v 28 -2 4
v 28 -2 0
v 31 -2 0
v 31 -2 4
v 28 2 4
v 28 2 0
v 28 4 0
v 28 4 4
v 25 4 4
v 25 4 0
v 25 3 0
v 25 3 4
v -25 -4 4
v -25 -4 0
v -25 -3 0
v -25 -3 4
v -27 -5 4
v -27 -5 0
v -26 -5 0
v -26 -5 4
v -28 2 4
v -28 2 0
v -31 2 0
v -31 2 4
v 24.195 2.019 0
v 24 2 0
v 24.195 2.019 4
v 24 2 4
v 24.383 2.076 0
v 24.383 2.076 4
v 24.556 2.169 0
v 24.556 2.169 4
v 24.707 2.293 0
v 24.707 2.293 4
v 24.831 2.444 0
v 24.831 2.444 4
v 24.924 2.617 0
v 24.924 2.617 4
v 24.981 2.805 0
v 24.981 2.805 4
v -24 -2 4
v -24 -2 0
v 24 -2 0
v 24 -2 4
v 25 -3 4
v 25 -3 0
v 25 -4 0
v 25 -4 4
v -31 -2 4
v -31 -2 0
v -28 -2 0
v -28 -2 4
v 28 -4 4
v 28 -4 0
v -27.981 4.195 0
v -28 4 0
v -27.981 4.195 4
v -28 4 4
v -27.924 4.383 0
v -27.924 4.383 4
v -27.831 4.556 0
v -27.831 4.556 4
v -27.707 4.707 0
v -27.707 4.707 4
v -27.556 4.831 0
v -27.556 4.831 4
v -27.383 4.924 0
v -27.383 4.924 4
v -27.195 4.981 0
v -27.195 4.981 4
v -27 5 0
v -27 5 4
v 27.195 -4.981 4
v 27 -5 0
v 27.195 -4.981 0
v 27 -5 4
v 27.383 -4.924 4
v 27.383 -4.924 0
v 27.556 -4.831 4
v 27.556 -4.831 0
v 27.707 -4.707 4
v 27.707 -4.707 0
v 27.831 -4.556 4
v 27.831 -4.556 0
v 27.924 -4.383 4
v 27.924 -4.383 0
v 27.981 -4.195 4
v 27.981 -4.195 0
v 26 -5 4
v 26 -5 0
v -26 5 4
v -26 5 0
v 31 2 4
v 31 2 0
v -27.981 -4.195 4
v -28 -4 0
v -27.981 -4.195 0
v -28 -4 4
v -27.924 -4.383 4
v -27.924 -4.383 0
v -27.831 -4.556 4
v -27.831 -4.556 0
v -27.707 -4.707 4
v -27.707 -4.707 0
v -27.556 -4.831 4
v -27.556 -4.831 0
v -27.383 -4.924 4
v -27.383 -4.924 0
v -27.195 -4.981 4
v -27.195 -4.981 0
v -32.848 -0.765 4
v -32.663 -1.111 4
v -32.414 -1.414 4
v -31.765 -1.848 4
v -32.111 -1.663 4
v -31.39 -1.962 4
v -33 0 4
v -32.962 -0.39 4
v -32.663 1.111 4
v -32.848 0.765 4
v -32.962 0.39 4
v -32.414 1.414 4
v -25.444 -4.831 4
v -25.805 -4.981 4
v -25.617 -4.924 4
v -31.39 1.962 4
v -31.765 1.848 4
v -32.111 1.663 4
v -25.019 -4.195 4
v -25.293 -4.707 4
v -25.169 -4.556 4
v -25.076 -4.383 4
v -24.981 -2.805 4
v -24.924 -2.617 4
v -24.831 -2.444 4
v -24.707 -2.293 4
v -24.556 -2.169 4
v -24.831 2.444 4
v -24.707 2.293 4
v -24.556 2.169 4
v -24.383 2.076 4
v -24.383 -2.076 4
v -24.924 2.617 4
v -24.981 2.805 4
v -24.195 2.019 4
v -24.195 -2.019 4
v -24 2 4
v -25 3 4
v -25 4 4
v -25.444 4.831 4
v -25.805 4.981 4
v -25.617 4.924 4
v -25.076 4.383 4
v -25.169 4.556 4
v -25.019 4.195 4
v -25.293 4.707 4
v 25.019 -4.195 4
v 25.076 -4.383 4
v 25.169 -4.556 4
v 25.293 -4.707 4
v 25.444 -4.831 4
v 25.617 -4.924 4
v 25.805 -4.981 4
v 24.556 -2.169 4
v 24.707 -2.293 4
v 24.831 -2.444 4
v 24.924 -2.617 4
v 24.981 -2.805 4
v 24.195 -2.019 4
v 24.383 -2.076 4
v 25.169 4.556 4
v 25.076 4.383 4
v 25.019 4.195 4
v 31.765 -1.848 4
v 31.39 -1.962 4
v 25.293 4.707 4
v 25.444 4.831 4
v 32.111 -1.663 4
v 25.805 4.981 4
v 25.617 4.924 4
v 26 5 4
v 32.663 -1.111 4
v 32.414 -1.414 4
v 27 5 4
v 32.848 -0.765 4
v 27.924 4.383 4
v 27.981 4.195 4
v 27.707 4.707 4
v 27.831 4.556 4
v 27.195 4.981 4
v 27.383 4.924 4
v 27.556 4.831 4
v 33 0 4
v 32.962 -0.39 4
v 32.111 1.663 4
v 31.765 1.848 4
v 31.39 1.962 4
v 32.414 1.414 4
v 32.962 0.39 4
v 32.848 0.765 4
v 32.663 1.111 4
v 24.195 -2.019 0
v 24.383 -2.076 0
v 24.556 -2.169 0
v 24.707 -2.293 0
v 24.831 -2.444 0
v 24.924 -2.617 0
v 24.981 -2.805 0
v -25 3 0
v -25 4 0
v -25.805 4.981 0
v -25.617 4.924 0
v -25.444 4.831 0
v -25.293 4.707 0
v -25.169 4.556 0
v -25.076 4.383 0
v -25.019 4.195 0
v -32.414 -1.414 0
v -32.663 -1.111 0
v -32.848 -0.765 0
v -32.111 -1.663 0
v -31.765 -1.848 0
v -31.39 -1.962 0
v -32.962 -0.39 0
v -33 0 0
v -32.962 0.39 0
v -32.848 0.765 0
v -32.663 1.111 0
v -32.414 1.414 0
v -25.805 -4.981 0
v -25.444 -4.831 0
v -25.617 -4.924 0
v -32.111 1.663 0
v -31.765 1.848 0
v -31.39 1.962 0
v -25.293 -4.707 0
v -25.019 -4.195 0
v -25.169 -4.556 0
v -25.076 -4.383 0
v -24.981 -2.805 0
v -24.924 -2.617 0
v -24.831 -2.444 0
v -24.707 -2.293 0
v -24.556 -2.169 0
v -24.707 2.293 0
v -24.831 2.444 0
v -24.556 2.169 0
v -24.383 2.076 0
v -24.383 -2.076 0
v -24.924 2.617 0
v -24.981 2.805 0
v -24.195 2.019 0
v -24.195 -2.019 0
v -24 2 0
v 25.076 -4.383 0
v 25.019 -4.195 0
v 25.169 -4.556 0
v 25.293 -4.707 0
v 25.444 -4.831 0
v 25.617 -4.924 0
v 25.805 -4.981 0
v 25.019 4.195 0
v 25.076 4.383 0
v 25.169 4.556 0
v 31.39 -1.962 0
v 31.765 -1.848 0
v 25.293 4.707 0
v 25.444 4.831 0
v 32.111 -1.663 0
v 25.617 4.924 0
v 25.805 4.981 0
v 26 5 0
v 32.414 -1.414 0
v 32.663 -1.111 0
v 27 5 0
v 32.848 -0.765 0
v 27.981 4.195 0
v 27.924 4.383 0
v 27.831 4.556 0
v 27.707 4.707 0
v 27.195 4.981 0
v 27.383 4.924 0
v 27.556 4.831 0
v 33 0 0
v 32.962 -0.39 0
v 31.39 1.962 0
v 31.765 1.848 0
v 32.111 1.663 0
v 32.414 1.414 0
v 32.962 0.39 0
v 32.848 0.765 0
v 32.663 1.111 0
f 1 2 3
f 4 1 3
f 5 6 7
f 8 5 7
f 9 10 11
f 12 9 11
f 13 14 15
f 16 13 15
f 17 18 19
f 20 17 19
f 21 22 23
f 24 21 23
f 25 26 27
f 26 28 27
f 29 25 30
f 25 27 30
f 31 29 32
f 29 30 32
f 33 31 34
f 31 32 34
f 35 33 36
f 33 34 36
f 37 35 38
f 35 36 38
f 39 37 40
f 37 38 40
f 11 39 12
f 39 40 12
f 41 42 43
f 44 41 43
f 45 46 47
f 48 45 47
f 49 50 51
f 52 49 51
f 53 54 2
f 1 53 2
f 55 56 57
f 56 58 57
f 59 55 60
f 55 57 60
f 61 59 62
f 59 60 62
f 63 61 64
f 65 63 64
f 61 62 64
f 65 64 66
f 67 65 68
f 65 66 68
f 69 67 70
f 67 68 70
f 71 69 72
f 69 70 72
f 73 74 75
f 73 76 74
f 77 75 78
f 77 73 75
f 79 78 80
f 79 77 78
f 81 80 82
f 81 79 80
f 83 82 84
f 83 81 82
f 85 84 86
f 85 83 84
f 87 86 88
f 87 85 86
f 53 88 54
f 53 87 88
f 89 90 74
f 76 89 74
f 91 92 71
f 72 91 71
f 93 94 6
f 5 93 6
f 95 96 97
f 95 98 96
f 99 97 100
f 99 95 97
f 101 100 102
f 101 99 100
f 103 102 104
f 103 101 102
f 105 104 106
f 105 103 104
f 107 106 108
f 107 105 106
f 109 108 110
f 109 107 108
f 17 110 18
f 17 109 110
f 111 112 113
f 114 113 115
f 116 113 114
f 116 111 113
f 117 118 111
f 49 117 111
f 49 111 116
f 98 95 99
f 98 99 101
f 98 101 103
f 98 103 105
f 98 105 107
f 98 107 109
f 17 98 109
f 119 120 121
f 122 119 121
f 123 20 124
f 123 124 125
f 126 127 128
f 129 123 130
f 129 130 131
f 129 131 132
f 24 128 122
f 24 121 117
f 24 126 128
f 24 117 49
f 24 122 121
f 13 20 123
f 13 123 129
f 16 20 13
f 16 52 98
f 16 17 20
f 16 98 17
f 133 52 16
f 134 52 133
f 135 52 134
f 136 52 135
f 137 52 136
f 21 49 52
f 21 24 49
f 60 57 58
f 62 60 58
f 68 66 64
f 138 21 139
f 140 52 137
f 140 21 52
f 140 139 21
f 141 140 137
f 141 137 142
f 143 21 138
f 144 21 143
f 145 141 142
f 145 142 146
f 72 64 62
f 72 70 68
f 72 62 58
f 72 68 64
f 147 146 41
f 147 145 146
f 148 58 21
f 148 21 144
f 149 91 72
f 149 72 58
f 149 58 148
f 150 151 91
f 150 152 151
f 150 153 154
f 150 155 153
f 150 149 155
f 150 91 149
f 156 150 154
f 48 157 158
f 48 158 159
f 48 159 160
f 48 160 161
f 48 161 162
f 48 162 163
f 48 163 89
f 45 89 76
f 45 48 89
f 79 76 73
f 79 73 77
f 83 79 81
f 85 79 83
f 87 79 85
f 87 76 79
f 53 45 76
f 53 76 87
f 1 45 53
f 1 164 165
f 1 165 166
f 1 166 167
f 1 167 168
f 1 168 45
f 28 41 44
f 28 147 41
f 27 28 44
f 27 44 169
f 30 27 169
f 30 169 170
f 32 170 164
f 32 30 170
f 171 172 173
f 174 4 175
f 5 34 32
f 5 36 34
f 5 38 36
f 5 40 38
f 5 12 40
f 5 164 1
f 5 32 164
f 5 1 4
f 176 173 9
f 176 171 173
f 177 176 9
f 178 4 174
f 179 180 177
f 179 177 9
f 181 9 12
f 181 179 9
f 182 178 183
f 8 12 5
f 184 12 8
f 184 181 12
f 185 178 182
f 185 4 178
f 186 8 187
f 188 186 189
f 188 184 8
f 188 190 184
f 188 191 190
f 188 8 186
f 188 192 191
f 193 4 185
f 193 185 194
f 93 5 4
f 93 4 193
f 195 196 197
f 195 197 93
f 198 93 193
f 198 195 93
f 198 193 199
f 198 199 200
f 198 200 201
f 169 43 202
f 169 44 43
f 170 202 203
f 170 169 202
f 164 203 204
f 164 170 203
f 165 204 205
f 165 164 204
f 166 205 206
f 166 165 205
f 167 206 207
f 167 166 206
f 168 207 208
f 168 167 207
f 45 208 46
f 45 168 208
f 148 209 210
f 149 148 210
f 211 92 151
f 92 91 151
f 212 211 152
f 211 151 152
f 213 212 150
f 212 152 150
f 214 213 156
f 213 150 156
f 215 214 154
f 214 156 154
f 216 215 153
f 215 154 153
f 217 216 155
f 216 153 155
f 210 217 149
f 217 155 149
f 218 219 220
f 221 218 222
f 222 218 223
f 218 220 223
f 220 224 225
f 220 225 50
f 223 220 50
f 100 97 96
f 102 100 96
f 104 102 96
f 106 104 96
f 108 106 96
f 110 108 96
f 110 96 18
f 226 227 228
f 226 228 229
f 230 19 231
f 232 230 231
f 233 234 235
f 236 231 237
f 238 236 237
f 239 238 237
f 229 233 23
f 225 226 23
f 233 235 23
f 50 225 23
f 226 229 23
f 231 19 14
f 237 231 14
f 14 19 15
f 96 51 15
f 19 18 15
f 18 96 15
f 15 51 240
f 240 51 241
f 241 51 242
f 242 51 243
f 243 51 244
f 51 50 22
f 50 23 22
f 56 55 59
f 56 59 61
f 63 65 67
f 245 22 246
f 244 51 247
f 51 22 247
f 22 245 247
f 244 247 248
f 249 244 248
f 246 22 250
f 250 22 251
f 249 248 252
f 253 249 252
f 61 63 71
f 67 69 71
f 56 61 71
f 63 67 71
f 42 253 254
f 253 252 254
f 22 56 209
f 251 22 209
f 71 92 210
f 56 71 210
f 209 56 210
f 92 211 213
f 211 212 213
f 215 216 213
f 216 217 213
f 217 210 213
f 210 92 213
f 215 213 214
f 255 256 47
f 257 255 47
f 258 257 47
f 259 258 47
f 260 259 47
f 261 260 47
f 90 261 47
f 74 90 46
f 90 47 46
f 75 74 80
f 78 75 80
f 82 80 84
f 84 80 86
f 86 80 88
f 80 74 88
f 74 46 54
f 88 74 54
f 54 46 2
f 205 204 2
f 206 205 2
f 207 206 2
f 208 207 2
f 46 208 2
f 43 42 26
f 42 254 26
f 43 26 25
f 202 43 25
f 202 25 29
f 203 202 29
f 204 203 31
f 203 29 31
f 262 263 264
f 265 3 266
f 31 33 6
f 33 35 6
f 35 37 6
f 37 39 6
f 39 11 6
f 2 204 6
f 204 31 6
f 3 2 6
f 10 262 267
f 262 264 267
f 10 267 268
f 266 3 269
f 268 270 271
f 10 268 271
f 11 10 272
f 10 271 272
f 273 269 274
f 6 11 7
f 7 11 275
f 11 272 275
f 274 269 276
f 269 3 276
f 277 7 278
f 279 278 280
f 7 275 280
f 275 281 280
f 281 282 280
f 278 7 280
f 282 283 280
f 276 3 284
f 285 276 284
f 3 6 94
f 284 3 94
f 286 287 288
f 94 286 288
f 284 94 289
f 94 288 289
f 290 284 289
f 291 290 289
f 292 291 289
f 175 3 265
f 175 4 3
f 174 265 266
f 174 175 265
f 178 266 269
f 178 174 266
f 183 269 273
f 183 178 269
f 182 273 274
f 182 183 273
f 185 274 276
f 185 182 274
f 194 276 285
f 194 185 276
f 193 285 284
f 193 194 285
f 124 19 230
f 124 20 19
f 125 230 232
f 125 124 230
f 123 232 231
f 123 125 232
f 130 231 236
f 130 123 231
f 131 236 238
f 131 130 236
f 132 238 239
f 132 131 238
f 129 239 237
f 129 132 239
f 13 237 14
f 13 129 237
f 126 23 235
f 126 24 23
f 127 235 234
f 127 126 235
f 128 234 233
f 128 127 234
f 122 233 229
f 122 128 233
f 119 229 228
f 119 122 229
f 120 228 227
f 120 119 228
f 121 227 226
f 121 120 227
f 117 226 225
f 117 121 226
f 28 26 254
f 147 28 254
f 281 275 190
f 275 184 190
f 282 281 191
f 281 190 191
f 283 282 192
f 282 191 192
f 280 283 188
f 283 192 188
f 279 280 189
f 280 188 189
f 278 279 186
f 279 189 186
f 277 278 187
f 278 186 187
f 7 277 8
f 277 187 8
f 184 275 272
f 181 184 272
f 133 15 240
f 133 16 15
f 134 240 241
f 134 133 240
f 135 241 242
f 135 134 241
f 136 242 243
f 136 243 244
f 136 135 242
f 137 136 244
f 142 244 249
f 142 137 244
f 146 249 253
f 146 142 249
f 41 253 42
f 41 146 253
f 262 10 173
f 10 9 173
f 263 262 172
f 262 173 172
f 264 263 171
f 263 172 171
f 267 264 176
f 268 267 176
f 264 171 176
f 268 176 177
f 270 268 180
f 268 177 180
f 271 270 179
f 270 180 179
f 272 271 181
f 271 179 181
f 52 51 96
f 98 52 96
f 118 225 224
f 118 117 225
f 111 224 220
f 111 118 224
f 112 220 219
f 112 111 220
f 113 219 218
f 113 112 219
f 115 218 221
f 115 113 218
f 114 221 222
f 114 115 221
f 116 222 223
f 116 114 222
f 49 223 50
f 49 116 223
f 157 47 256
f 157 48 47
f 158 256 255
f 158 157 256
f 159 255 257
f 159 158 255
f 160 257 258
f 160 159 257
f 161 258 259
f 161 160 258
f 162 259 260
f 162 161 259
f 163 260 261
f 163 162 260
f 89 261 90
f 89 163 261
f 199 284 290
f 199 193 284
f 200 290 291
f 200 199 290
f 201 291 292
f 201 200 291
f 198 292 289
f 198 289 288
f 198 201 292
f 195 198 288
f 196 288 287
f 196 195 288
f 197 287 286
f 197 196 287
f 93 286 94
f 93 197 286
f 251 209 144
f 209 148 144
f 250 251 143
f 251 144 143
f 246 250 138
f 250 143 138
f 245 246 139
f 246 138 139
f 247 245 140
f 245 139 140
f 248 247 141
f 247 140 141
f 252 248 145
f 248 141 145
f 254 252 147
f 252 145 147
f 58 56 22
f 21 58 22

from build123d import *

# Parameters (mm, degrees)
F1_DEPTH = 4
F2_R     = 1.99999
F3_R     = 1


# Not quite as in the source:
# - a fillet or chamfer is up to 0.001 mm smaller than in the source, because OpenCascade refuses the exact size


with BuildPart() as f1:
    # F0 (on Top) → F1 (new body)
    with BuildSketch(Plane.XY):
        Polygon((-28, 2), (-33, 2), (-33, -2), (-28, -2), (-28, -5), (-25, -5), (-25, -2), (25, -2), (25, -5), (28, -5), (28, -2), (33, -2), (33, 2), (28, 2), (28, 5), (25, 5), (25, 2), (-25, 2), (-25, 5), (-28, 5), align=None)
    extrude(amount=F1_DEPTH)

    # F2 (radius 2 in the source; OpenCascade refuses exactly that, so slightly less here)
    f2_edges = [f1.edges().sort_by_distance(p)[0] for p in [
        (33, -2, 2),
        (33, 2, 2),
        (-33, -2, 2),
        (-33, 2, 2),
    ]]
    fillet(f2_edges, radius=F2_R)

    # F3
    f3_edges = [f1.edges().sort_by_distance(p)[0] for p in [
        (-28, -5, 2),
        (-28, 5, 2),
        (28, -5, 2),
        (28, 5, 2),
        (-25, -5, 2),
        (-25, 5, 2),
        (25, 5, 2),
        (25, -5, 2),
        (25, -2, 2),
        (25, 2, 2),
        (-25, 2, 2),
        (-25, -2, 2),
    ]]
    fillet(f3_edges, radius=F3_R)


solid = f1.part
